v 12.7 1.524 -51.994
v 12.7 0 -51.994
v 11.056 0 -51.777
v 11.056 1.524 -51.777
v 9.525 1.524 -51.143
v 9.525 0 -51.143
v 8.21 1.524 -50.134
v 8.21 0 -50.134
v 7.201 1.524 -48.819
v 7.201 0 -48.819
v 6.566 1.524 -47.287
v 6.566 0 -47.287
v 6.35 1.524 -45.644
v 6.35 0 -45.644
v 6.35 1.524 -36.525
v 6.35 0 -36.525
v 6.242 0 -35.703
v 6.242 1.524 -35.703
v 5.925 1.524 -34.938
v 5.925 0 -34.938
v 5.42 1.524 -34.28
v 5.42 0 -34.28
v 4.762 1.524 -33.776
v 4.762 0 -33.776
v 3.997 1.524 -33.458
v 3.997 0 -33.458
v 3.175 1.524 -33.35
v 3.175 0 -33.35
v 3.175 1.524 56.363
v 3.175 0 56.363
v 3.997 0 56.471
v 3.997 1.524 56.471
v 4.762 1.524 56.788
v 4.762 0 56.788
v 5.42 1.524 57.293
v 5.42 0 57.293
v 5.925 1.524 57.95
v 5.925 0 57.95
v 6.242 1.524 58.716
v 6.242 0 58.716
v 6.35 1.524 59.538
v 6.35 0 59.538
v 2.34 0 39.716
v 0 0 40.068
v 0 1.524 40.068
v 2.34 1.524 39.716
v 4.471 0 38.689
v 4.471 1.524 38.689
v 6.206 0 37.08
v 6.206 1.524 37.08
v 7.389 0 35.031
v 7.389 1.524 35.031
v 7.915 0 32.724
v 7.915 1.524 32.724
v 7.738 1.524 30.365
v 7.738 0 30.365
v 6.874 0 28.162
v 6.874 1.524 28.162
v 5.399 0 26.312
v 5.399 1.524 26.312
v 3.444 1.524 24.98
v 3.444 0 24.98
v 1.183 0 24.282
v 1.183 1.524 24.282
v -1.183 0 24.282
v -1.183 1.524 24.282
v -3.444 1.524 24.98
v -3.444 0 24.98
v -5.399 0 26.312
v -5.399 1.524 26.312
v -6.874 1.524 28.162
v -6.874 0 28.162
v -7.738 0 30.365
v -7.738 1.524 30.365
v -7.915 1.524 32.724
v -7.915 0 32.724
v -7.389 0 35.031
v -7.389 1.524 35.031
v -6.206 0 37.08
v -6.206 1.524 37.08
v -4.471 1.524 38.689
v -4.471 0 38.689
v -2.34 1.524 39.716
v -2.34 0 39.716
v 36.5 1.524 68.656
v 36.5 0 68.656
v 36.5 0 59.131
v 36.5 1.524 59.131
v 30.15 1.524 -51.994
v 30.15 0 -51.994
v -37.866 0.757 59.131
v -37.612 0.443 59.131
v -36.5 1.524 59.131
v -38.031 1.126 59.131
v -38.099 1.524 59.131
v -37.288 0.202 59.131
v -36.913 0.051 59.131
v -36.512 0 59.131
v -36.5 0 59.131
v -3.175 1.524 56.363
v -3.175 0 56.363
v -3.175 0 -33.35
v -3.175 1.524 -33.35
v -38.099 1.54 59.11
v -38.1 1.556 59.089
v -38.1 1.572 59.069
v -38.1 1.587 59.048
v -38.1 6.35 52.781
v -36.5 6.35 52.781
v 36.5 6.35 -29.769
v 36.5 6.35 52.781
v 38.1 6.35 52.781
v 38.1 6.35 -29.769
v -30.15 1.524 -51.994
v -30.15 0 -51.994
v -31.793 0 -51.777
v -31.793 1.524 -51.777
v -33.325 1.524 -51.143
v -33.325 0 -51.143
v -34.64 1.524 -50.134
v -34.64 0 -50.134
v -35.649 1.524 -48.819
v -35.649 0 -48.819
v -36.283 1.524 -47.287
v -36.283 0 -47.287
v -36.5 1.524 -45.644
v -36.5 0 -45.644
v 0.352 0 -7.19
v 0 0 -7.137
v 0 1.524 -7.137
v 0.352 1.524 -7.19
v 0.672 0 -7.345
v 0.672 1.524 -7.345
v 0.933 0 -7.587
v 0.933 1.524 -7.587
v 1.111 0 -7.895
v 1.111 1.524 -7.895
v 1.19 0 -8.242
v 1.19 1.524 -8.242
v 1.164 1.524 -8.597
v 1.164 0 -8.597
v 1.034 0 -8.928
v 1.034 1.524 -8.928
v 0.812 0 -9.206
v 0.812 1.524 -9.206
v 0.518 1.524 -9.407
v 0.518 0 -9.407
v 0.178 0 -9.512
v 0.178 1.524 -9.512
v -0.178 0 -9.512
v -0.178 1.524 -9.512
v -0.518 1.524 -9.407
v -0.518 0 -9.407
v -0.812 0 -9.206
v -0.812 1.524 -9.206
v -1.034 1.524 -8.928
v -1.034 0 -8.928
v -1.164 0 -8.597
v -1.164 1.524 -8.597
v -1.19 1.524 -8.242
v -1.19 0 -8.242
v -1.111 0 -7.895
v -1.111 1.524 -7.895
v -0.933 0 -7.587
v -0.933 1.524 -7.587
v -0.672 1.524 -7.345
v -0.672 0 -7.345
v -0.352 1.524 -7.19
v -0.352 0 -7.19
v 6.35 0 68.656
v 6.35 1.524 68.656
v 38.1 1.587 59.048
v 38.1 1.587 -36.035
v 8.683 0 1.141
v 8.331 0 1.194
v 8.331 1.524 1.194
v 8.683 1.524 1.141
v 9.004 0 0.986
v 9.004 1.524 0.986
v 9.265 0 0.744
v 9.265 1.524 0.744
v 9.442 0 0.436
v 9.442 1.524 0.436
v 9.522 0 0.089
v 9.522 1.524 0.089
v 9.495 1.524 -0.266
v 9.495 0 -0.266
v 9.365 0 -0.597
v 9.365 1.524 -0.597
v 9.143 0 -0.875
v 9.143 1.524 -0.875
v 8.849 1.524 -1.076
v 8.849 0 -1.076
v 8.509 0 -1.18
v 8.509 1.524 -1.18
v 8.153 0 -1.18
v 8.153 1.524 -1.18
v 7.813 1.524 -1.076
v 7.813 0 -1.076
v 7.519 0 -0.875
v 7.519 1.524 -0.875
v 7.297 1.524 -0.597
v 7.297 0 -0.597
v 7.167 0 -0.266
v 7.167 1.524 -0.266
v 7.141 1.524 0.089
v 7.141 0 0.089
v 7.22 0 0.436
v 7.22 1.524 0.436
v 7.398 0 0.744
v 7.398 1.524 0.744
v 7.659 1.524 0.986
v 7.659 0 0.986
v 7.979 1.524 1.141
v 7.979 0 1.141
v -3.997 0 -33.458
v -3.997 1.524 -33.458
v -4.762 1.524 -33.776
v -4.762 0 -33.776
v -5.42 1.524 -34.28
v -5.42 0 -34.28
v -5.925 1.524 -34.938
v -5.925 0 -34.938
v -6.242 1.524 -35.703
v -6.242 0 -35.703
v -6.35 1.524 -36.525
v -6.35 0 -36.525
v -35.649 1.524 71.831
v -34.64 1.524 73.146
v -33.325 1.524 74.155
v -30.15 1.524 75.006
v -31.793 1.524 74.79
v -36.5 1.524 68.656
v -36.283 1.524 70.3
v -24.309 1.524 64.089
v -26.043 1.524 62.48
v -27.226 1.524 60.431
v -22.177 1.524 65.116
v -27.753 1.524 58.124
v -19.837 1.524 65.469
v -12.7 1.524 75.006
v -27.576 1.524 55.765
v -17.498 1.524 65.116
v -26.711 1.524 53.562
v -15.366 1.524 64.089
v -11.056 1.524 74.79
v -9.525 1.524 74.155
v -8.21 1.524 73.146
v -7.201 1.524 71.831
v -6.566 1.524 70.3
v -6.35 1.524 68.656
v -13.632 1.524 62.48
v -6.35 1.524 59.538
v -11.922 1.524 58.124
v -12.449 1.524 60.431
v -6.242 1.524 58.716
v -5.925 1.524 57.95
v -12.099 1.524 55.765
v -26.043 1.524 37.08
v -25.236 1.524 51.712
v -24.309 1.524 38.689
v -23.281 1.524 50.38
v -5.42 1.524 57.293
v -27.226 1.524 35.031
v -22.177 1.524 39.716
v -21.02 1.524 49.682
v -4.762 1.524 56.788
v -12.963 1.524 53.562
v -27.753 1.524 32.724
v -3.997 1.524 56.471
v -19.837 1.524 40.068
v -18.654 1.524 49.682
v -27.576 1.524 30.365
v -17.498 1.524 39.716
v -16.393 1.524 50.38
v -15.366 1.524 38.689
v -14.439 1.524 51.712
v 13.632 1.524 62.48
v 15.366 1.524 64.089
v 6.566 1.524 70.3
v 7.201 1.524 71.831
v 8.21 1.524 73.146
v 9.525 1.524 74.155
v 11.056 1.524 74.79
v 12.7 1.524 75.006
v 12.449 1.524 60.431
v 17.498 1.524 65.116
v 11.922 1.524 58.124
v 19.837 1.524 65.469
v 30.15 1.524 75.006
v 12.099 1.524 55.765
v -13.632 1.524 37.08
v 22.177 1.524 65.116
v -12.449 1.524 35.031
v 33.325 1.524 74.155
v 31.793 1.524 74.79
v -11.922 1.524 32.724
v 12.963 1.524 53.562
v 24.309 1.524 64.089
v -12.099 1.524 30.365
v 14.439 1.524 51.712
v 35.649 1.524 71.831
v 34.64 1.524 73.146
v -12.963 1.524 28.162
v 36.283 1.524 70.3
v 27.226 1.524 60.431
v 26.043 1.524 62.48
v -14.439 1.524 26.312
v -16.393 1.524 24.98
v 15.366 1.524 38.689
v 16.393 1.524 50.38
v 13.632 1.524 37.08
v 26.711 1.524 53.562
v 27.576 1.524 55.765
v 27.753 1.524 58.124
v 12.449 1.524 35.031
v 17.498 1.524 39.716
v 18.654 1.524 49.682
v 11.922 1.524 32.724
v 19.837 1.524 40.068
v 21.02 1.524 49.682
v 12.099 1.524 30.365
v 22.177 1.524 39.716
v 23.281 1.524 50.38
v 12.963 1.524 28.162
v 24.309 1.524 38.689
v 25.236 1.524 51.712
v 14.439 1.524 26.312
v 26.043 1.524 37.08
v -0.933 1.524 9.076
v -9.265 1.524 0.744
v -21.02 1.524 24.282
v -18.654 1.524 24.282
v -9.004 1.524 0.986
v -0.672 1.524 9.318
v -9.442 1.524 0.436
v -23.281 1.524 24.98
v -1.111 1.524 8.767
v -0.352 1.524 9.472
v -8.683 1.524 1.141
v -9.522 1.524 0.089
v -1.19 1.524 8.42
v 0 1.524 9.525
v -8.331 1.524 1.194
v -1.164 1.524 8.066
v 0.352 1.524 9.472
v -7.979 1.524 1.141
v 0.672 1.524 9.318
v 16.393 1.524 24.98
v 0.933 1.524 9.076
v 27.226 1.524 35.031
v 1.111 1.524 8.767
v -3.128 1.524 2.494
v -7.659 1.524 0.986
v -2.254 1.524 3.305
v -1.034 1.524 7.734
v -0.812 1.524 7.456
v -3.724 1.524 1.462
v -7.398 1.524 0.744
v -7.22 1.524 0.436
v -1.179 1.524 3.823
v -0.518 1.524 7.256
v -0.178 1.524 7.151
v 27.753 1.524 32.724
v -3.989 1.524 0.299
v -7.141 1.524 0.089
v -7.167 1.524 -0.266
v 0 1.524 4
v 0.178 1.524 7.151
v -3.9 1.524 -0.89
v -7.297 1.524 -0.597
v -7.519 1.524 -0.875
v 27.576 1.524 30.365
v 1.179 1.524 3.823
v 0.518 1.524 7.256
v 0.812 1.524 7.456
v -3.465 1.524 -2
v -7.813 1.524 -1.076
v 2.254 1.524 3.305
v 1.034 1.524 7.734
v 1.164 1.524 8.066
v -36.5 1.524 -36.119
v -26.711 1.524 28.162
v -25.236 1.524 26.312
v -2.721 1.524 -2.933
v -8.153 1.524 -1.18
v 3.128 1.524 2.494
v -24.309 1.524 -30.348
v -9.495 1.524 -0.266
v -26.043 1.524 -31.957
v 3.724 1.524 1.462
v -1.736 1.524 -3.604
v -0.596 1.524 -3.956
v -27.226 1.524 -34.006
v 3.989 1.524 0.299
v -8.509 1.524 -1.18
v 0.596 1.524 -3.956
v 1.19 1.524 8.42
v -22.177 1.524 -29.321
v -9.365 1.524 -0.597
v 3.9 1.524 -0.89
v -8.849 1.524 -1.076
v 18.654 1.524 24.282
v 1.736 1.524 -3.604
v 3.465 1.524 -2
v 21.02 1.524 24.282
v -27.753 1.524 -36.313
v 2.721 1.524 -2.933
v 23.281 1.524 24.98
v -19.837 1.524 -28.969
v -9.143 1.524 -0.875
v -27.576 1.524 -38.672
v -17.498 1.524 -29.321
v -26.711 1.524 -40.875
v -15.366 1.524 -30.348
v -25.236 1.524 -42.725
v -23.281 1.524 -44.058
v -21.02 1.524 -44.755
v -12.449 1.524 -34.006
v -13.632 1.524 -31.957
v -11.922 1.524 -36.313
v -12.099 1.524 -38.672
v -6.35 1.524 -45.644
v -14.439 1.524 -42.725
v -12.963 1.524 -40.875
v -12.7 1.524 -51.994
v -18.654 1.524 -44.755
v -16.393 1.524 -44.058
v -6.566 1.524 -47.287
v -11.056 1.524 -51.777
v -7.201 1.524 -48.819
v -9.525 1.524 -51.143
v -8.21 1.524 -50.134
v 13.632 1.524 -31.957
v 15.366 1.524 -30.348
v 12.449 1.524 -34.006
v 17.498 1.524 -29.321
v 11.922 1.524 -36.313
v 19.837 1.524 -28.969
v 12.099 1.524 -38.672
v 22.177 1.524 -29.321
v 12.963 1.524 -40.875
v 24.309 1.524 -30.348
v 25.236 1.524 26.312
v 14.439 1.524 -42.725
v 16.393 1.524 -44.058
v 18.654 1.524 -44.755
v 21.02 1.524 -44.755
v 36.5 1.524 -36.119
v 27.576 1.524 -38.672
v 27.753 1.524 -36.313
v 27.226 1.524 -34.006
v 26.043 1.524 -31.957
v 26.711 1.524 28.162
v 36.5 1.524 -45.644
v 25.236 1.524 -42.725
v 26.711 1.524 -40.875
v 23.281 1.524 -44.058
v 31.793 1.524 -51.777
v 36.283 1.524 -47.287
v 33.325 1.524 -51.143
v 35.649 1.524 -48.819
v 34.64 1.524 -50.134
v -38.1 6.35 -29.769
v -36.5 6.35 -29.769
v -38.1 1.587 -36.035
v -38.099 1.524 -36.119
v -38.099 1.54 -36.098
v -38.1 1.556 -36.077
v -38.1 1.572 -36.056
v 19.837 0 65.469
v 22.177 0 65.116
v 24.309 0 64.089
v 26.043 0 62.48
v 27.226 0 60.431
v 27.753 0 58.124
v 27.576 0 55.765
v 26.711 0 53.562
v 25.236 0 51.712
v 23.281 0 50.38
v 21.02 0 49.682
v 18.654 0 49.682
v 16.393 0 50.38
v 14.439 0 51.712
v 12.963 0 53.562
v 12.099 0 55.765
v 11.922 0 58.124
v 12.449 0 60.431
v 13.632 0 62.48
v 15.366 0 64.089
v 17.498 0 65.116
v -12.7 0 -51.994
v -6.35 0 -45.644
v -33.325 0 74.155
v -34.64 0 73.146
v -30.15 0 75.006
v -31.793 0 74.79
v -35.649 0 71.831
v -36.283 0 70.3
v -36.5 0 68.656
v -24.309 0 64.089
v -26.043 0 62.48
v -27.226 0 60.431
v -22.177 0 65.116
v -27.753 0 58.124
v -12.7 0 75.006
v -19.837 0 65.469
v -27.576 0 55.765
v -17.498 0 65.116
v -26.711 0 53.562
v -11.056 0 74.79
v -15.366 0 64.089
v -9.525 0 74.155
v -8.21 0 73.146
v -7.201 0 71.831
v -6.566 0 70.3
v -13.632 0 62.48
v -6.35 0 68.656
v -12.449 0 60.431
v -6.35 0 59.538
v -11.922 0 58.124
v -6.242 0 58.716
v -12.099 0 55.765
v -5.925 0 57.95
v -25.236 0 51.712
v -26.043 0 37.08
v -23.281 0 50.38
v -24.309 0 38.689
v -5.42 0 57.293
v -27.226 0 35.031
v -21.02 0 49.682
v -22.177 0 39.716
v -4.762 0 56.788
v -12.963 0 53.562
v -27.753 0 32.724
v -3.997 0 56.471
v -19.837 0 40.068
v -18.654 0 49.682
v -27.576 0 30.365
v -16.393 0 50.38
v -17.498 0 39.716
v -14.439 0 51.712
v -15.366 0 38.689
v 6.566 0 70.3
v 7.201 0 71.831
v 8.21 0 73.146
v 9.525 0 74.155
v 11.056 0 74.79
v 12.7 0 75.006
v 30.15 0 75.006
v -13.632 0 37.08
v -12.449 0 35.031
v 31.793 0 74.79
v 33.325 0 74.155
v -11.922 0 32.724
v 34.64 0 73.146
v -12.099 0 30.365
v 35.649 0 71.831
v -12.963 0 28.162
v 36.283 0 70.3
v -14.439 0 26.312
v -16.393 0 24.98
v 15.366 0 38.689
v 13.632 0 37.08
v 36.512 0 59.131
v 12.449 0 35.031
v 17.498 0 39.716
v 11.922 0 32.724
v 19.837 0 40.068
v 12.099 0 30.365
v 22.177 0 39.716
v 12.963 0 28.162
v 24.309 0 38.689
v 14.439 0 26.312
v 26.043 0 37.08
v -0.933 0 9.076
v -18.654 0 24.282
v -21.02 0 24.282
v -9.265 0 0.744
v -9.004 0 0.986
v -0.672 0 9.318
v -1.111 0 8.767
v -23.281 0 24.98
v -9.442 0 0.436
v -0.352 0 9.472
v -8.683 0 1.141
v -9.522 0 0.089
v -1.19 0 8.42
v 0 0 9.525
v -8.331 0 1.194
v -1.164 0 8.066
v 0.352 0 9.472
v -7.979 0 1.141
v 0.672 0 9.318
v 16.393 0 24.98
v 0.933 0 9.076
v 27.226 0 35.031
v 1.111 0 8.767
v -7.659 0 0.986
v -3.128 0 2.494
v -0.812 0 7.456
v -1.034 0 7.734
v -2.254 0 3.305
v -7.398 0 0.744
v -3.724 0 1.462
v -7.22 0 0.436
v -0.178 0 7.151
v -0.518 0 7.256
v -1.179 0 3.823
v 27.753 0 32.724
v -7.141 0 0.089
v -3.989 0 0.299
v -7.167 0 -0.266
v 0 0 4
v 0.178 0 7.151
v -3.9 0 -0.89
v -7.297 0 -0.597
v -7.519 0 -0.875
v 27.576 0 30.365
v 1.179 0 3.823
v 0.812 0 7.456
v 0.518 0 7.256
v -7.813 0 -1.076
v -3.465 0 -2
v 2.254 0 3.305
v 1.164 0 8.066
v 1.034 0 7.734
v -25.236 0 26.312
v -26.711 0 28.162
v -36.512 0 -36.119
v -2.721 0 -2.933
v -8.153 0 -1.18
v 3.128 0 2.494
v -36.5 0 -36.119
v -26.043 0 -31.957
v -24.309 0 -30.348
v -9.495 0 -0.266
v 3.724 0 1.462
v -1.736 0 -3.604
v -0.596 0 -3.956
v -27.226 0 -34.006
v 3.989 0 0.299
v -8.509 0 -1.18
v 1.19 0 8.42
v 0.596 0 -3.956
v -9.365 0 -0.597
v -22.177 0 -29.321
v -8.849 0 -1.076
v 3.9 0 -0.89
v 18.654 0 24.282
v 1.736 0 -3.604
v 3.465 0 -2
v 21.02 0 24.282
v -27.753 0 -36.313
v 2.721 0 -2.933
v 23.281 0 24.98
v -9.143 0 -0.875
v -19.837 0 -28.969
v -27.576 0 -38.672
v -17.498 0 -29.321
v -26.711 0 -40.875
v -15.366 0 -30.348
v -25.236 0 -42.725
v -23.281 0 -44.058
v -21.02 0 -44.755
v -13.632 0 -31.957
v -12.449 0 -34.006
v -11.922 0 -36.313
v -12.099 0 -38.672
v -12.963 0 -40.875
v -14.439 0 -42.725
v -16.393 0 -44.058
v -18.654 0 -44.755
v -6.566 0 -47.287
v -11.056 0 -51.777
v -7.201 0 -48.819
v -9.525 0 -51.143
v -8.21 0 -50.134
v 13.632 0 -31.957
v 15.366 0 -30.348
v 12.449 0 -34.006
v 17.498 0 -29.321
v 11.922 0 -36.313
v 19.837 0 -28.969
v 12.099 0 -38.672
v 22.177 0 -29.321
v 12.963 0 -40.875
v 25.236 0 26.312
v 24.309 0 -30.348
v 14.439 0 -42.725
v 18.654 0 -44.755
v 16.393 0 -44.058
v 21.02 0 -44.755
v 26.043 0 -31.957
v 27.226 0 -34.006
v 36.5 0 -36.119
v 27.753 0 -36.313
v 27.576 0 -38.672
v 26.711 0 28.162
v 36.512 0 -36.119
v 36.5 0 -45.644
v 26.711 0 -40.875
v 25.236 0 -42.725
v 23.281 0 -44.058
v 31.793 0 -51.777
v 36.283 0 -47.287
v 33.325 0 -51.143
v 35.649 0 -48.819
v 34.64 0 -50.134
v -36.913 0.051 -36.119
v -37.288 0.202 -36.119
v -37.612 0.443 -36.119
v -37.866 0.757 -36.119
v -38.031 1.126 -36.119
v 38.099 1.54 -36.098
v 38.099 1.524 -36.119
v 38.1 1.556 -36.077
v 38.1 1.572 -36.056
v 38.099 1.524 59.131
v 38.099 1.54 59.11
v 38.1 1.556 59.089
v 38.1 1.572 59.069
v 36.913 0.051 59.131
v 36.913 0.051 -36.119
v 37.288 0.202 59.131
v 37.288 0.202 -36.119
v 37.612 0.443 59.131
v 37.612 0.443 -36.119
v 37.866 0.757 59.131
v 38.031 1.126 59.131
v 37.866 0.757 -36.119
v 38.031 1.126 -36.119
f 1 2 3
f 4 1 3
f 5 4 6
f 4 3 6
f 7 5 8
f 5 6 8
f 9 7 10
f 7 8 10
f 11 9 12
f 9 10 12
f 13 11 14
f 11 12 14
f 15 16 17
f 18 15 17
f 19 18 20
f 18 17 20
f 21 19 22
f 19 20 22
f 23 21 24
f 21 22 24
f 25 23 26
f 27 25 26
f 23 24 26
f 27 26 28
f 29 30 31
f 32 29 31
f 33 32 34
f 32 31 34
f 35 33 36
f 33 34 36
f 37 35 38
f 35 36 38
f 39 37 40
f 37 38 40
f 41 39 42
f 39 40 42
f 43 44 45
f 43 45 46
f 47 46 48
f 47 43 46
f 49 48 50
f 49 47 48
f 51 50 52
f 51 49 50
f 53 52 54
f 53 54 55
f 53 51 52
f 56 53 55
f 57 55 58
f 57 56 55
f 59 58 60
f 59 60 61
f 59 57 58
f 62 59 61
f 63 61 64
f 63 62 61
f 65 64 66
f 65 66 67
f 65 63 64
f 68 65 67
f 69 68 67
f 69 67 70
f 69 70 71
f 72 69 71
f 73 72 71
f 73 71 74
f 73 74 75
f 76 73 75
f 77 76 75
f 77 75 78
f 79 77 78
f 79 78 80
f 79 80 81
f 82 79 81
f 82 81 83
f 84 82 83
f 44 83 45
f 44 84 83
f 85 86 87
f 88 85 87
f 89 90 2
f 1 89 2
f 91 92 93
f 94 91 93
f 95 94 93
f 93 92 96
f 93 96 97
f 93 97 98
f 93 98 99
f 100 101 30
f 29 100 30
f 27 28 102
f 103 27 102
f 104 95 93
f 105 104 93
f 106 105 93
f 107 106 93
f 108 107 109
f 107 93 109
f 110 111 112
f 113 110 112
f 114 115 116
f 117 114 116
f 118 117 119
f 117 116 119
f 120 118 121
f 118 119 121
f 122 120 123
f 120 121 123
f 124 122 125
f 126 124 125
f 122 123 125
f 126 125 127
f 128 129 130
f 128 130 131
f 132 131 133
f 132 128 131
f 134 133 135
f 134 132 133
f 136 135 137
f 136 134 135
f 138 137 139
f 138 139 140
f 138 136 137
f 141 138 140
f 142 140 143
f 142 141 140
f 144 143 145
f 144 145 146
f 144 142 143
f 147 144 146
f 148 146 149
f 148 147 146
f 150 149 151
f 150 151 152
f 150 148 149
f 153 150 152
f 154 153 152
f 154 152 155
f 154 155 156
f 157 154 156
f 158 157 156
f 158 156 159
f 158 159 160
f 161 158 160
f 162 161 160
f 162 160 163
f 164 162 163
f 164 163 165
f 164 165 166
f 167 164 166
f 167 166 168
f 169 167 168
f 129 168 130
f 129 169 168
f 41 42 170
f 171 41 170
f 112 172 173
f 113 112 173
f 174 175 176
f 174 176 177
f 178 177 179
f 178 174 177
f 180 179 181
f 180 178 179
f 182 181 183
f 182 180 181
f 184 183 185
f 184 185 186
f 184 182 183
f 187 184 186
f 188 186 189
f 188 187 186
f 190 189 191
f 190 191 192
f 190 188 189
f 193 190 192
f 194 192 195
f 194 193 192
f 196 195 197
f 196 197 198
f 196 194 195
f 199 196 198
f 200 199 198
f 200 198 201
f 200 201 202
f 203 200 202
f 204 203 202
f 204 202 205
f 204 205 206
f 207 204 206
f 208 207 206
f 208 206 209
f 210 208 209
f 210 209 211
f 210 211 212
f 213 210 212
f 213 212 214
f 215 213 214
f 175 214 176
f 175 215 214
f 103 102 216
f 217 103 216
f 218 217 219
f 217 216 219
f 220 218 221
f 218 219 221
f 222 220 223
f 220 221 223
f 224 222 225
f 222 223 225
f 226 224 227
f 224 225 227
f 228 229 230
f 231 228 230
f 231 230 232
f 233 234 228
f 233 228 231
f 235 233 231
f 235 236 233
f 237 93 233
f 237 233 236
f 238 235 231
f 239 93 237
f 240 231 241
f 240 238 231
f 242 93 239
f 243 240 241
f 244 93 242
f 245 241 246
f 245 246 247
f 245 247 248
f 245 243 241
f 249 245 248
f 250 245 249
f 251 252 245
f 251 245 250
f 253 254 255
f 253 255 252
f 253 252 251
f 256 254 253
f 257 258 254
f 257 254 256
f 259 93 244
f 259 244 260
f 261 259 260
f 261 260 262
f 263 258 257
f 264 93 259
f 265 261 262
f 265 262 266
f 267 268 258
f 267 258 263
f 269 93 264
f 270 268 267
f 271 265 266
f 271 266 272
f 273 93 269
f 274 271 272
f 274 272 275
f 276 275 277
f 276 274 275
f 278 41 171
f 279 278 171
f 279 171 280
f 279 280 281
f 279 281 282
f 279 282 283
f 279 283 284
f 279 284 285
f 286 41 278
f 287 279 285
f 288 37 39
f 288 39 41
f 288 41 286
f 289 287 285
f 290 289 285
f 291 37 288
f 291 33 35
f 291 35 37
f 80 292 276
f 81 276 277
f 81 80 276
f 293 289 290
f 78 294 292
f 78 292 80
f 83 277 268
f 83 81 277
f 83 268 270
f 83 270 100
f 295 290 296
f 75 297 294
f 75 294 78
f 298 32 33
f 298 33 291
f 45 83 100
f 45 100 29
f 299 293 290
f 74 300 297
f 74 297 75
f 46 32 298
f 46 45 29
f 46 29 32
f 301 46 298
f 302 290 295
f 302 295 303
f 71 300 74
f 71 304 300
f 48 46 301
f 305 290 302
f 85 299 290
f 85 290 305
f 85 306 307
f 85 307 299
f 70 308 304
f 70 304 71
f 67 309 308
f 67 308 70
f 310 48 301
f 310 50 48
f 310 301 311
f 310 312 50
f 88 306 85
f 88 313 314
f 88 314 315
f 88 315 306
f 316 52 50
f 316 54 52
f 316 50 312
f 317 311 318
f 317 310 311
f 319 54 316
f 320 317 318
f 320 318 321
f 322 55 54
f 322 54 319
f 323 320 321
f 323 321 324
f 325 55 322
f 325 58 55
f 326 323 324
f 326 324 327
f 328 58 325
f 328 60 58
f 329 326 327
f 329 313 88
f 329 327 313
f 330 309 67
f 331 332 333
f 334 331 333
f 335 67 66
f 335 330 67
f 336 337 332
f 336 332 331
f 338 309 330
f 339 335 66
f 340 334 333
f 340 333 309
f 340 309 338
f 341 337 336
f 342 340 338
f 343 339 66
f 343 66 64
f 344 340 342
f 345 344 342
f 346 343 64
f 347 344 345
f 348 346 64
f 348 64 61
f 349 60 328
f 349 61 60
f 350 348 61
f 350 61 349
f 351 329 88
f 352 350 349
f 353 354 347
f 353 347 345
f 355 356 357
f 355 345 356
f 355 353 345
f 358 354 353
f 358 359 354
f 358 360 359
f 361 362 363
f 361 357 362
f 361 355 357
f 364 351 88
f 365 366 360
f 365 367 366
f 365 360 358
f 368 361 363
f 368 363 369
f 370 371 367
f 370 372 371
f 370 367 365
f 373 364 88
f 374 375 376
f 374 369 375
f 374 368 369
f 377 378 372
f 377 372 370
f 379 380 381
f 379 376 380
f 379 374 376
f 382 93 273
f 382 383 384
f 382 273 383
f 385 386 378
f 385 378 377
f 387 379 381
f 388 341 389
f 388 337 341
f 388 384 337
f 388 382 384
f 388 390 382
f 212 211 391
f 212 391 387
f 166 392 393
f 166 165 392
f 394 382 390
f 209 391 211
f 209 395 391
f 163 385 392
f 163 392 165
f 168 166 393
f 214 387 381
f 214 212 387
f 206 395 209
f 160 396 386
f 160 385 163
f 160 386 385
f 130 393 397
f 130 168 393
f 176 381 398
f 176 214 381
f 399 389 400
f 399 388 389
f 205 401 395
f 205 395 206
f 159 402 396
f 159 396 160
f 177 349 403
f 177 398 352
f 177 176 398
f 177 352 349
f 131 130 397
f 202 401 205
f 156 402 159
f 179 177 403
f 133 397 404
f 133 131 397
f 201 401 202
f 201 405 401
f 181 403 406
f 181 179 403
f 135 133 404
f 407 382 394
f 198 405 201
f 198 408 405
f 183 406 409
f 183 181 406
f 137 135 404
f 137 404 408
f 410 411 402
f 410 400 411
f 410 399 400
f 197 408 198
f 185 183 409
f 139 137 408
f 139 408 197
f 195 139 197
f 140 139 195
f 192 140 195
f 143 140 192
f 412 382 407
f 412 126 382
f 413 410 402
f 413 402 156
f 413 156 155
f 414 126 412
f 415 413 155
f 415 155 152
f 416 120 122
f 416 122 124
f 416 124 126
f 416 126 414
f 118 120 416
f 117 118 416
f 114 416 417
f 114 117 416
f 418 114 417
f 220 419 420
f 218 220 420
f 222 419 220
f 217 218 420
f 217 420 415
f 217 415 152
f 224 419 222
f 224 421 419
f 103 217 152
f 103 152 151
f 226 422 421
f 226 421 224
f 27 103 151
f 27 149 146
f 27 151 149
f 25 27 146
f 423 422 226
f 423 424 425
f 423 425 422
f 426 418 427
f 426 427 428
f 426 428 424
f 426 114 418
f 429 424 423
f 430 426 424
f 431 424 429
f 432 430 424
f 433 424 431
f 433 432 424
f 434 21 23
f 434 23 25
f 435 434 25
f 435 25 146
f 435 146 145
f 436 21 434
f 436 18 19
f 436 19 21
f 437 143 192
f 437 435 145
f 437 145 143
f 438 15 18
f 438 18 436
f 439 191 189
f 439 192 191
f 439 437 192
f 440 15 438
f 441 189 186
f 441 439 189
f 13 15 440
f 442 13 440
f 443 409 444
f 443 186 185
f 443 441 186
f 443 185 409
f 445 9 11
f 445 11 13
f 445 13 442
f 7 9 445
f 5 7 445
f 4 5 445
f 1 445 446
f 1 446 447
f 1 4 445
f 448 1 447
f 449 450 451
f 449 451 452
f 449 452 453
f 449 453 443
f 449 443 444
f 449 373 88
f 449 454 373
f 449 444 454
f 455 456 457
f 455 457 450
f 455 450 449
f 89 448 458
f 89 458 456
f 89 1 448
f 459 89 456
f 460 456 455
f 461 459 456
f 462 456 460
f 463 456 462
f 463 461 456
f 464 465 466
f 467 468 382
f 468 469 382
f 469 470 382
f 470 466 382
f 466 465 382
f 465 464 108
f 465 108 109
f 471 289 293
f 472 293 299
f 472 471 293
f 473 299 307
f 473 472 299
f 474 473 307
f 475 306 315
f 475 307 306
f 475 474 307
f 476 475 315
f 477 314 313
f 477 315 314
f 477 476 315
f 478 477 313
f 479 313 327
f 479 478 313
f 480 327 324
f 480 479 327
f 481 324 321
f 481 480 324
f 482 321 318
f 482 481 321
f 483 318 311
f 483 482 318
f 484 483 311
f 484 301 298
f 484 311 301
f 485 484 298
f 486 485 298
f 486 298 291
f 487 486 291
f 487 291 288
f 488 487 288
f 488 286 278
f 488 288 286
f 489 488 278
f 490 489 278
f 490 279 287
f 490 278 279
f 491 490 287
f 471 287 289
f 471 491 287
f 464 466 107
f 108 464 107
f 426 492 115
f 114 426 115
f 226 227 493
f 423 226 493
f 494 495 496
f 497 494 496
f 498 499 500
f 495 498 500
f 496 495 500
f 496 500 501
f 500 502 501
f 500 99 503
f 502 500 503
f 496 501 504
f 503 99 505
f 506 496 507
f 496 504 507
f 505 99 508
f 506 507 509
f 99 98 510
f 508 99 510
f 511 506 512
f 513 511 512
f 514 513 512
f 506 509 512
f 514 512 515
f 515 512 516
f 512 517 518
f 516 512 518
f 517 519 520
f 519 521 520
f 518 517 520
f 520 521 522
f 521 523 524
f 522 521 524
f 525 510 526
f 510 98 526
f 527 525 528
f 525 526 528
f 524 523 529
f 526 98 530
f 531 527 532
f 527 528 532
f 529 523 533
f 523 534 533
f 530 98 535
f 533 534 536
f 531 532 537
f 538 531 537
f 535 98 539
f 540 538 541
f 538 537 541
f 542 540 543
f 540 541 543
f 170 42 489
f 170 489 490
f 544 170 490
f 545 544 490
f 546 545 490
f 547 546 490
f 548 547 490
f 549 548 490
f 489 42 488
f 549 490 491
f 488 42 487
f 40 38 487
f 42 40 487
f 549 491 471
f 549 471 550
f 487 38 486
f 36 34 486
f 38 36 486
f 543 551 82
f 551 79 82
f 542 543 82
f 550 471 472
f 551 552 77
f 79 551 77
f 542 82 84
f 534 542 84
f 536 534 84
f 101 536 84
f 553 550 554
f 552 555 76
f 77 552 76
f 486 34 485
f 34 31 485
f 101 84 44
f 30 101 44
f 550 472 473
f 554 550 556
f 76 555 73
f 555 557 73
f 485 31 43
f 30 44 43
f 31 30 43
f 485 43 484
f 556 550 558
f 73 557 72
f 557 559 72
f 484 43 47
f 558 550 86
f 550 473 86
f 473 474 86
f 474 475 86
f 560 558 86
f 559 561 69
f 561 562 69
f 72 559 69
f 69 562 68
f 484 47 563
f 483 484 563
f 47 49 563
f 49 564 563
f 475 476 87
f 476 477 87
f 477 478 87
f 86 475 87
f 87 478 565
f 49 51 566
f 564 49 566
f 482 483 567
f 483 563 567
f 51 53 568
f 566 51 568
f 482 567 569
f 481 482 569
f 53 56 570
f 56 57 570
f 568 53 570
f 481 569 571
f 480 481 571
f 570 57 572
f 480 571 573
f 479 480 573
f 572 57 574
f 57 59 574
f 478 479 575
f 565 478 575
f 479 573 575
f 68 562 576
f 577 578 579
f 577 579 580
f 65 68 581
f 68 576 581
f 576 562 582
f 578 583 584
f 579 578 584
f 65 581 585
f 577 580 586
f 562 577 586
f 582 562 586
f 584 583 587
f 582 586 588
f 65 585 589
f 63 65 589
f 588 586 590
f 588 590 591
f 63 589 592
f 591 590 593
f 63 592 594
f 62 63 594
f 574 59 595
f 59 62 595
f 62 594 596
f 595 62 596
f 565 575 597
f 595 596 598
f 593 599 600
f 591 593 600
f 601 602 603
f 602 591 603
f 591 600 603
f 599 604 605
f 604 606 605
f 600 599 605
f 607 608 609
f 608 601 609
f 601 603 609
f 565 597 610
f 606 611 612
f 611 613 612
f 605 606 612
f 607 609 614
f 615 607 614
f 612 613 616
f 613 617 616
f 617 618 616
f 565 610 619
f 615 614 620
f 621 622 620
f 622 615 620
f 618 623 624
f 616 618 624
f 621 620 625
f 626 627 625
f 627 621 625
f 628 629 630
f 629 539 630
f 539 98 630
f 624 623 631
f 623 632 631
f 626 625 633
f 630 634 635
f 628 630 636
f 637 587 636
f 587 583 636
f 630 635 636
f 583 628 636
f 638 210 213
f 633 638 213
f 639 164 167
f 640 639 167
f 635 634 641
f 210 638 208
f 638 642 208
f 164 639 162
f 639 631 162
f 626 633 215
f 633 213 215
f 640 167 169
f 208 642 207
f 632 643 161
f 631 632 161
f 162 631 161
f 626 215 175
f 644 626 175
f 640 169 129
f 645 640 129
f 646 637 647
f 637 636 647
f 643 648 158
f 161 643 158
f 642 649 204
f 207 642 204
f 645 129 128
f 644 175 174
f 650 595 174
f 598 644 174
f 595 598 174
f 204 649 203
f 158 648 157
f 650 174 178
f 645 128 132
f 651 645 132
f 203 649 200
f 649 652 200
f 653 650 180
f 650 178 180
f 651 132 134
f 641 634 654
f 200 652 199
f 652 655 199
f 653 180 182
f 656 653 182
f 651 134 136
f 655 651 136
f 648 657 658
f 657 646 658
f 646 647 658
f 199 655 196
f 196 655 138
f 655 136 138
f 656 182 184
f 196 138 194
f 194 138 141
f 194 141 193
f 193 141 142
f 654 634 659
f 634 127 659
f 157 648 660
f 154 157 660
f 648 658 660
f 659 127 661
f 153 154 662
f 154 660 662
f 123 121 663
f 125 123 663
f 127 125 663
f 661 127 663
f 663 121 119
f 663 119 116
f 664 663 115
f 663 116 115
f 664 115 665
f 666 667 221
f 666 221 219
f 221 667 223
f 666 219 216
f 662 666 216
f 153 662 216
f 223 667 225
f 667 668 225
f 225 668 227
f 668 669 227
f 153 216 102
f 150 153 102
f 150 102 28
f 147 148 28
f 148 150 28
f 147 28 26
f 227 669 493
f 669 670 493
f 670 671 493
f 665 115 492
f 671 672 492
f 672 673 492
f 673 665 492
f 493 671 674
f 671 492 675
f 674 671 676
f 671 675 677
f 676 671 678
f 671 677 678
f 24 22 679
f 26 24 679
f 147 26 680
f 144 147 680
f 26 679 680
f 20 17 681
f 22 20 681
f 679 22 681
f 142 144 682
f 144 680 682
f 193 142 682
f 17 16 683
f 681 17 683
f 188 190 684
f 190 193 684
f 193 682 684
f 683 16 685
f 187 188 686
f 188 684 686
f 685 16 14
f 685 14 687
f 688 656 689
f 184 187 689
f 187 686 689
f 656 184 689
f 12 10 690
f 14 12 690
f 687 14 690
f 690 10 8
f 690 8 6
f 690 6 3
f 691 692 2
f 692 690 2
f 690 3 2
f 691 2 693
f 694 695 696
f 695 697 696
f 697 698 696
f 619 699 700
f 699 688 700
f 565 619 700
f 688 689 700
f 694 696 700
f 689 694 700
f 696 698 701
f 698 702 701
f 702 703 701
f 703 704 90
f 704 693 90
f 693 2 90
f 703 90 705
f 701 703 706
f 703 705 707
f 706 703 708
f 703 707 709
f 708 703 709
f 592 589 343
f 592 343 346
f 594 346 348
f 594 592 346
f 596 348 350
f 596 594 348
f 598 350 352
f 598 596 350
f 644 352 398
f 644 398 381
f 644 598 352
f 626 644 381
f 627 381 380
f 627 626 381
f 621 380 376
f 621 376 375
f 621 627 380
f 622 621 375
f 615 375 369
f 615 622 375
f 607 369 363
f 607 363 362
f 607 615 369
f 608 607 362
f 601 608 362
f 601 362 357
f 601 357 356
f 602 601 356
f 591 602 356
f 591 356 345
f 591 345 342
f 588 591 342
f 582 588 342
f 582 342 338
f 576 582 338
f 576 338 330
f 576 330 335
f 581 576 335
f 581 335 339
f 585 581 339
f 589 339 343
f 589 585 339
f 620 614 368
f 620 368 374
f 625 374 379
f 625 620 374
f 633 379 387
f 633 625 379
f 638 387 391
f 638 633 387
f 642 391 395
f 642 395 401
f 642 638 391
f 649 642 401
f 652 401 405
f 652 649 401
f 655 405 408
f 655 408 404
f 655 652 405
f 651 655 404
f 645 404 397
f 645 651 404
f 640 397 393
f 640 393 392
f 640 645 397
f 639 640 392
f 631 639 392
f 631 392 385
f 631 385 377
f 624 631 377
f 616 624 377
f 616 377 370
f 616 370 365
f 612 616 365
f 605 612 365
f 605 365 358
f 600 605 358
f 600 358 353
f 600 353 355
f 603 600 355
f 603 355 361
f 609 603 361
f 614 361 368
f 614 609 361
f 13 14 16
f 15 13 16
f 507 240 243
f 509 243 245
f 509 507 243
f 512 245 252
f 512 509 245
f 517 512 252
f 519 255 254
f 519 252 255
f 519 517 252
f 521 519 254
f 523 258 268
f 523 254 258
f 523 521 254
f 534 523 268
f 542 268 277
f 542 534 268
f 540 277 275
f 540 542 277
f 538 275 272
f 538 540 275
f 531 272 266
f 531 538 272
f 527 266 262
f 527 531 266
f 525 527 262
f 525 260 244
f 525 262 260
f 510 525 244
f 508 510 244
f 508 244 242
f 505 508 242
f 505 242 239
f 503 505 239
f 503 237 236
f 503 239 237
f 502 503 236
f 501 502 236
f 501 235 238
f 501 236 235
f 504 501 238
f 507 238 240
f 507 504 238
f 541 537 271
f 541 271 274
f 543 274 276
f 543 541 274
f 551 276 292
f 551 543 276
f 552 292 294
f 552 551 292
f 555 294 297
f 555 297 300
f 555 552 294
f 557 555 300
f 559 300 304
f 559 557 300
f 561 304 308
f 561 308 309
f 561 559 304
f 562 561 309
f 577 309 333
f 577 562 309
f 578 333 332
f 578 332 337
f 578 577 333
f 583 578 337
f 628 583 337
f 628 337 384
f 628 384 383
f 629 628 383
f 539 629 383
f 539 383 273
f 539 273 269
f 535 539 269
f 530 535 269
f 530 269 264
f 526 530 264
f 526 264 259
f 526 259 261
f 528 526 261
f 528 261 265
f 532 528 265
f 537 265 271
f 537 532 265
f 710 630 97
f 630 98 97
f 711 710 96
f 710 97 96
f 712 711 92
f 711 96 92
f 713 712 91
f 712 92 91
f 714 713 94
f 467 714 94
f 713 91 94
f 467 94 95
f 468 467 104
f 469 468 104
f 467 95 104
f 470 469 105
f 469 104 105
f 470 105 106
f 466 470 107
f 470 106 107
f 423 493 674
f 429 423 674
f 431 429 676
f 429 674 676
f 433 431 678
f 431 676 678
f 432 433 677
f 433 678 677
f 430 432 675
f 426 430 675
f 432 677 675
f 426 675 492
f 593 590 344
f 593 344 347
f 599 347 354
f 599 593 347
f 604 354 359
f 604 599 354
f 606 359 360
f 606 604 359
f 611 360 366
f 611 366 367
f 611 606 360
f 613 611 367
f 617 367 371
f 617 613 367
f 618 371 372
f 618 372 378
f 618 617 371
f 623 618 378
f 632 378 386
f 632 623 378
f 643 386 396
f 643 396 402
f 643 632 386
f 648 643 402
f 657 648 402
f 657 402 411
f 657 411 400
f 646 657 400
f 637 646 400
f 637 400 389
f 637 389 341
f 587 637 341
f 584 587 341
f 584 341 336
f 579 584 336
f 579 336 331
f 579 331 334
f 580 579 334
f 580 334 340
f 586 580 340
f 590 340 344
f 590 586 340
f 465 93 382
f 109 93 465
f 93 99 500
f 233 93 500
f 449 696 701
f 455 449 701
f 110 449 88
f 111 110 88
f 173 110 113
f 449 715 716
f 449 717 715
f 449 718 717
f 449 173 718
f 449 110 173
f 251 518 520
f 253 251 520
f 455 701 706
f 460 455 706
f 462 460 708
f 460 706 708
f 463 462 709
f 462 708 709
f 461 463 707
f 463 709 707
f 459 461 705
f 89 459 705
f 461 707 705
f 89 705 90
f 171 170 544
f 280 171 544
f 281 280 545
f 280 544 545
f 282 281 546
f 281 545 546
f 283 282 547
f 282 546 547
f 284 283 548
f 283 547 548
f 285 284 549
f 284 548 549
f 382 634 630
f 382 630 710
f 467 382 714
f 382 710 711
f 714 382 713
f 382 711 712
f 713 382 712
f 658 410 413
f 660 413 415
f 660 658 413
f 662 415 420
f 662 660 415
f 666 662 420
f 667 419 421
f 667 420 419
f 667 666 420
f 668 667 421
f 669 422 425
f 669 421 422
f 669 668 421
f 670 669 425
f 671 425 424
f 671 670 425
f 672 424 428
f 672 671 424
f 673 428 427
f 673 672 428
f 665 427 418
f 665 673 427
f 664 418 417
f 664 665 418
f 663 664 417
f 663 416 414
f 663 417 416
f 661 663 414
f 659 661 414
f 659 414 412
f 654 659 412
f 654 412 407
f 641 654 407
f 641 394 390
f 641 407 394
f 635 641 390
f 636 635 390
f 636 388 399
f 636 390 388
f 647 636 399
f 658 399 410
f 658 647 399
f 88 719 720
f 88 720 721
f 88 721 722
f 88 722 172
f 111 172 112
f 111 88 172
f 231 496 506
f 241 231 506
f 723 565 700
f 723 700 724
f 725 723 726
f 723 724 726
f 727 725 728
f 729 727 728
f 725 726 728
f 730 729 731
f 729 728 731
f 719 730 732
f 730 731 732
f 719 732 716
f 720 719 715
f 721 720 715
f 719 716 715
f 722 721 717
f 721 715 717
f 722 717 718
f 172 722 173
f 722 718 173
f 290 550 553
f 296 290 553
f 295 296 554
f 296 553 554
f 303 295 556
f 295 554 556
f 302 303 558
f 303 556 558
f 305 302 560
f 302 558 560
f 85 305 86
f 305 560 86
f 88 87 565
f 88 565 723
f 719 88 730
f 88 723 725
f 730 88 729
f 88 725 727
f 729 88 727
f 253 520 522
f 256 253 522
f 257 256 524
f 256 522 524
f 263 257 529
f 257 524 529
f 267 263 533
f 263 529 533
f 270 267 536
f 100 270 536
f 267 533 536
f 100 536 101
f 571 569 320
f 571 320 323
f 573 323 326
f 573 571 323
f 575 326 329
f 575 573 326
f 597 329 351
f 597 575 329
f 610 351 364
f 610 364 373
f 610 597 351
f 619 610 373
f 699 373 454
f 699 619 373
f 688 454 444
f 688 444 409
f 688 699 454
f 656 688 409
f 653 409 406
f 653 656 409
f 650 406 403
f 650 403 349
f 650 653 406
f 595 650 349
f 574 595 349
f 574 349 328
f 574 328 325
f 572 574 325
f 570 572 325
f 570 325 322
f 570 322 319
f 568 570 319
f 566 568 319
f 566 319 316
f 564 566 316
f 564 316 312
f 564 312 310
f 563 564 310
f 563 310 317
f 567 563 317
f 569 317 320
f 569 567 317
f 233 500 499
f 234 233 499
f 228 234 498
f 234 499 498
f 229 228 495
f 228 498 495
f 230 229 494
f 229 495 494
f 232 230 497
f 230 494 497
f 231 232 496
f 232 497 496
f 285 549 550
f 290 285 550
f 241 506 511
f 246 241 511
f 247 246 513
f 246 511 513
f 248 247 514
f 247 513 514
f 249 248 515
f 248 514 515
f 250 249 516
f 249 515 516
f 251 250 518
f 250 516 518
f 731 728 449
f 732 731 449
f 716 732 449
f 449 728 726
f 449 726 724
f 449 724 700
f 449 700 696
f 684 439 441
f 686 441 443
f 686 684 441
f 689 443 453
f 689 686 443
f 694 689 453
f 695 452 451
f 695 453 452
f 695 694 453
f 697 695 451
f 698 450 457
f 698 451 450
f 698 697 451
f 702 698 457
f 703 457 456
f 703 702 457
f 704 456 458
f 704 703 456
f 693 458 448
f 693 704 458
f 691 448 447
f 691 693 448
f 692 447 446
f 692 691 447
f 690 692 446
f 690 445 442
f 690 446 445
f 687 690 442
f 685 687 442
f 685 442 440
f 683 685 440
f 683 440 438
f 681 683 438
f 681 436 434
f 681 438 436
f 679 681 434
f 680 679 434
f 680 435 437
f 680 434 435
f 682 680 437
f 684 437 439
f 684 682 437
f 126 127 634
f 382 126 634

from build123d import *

# Parameters (mm, degrees)
SKETCH1_R               = 7.9375
SKETCH1_R_2             = 4.0005
SKETCH1_R_3             = 1.1938
EXTRUDE1_DEPTH          = 1.524
EXTRUDE2_DEPTH          = 6.35
CUT_EXTRUDE1_DEPTH      = 39.1
CUT_EXTRUDE1_DEPTH_BACK = 39.1
FILLET1_R               = 1.5875


with BuildPart() as part:
    # Sketch1 → Extrude1 (new body)
    with BuildSketch(Plane(origin=(0, 0, 0), x_dir=(1, 0, 0), z_dir=(0, 1, 0))):
        with BuildLine():
            Line((36.4998, -62.3062), (36.4998, 36.1188))
            Line((36.4998, 36.1188), (36.4998, 39.2938))
            Line((36.4998, 39.2938), (36.4998, 45.6438))
            ThreePointArc((36.4998, 45.6438), (34.639928061, 50.133928061), (30.1498, 51.9938))
            Line((30.1498, 51.9938), (23.7998, 51.9938))
            Line((23.7998, 51.9938), (12.7, 51.9938))
            ThreePointArc((12.7, 51.9938), (8.209871939, 50.133928061), (6.35, 45.6438))
            Line((6.35, 45.6438), (6.35, 36.5252))
            ThreePointArc((6.35, 36.5252), (5.42006403, 34.28013597), (3.175, 33.3502))
            Line((3.175, 33.3502), (-3.175, 33.3502))
            ThreePointArc((-3.175, 33.3502), (-5.42006403, 34.28013597), (-6.35, 36.5252))
            Line((-6.35, 36.5252), (-6.35, 45.6438))
            ThreePointArc((-6.35, 45.6438), (-8.209871939, 50.133928061), (-12.7, 51.9938))
            Line((-12.7, 51.9938), (-23.7998, 51.9938))
            Line((-23.7998, 51.9938), (-30.1498, 51.9938))
            ThreePointArc((-30.1498, 51.9938), (-34.639928061, 50.133928061), (-36.4998, 45.6438))
            Line((-36.4998, 45.6438), (-36.4998, 39.2938))
            Line((-36.4998, 39.2938), (-36.4998, 36.1188))
            Line((-36.4998, 36.1188), (-36.4998, -62.3062))
            Line((-36.4998, -62.3062), (-36.4998, -68.6562))
            ThreePointArc((-36.4998, -68.6562), (-34.639928061, -73.146328061), (-30.1498, -75.0062))
            Line((-30.1498, -75.0062), (-23.7998, -75.0062))
            Line((-23.7998, -75.0062), (-12.7, -75.0062))
            ThreePointArc((-12.7, -75.0062), (-8.209871939, -73.146328061), (-6.35, -68.6562))
            Line((-6.35, -68.6562), (-6.35, -59.5376))
            ThreePointArc((-6.35, -59.5376), (-5.42006403, -57.29253597), (-3.175, -56.3626))
            Line((-3.175, -56.3626), (3.175, -56.3626))
            ThreePointArc((3.175, -56.3626), (5.42006403, -57.29253597), (6.35, -59.5376))
            Line((6.35, -59.5376), (6.35, -68.6562))
            ThreePointArc((6.35, -68.6562), (8.209871939, -73.146328061), (12.7, -75.0062))
            Line((12.7, -75.0062), (23.7998, -75.0062))
            Line((23.7998, -75.0062), (30.1498, -75.0062))
            ThreePointArc((30.1498, -75.0062), (34.639928061, -73.146328061), (36.4998, -68.6562))
            Line((36.4998, -68.6562), (36.4998, -62.3062))
        make_face()
        with Locations(Location((19.8374, -57.531, 0), (0, 0, 270))):  # turned: the seam where the file's is
            Circle(SKETCH1_R, mode=Mode.SUBTRACT)
        with Locations(Location((19.8374, -32.131, 0), (0, 0, 270))):  # turned: the seam where the file's is
            Circle(SKETCH1_R, mode=Mode.SUBTRACT)
        with Locations(Location((0, 0, 0), (0, 0, 270))):  # turned: the seam where the file's is
            Circle(SKETCH1_R_2, mode=Mode.SUBTRACT)
        with Locations(Location((8.3312, 0, 0), (0, 0, 270))):  # turned: the seam where the file's is
            Circle(SKETCH1_R_3, mode=Mode.SUBTRACT)
        with Locations(Location((0, -8.3312, 0), (0, 0, 270))):  # turned: the seam where the file's is
            Circle(SKETCH1_R_3, mode=Mode.SUBTRACT)
        with Locations(Location((0, 8.3312, 0), (0, 0, 270))):  # turned: the seam where the file's is
            Circle(SKETCH1_R_3, mode=Mode.SUBTRACT)
        with Locations(Location((-8.3312, 0, 0), (0, 0, 270))):  # turned: the seam where the file's is
            Circle(SKETCH1_R_3, mode=Mode.SUBTRACT)
        with Locations(Location((19.8374, 36.9062, 0), (0, 0, 270))):  # turned: the seam where the file's is
            Circle(SKETCH1_R, mode=Mode.SUBTRACT)
        with Locations(Location((0, -32.131, 0), (0, 0, 270))):  # turned: the seam where the file's is
            Circle(SKETCH1_R, mode=Mode.SUBTRACT)
        with Locations(Location((-19.8374, 36.9062, 0), (0, 0, 270))):  # turned: the seam where the file's is
            Circle(SKETCH1_R, mode=Mode.SUBTRACT)
        with Locations(Location((-19.8374, -32.131, 0), (0, 0, 270))):  # turned: the seam where the file's is
            Circle(SKETCH1_R, mode=Mode.SUBTRACT)
        with Locations(Location((-19.8374, -57.531, 0), (0, 0, 270))):  # turned: the seam where the file's is
            Circle(SKETCH1_R, mode=Mode.SUBTRACT)
    extrude(amount=EXTRUDE1_DEPTH)

    # Sketch1_3 → Extrude2 (add)
    with BuildSketch(Plane(origin=(0, 0, 0), x_dir=(1, 0, 0), z_dir=(0, 1, 0))):
        Polygon((36.4998, 36.1188), (36.4998, -59.1312), (38.1, -59.1312), (38.1, 29.7688), (38.1, 36.1188), align=None)
        Polygon((-38.1, -59.1312), (-36.4998, -59.1312), (-36.4998, 36.1188), (-38.1, 36.1188), (-38.1, 29.7688), align=None)
    extrude(amount=EXTRUDE2_DEPTH)

    # Sketch2 → Cut-Extrude1 (cut, two sides)
    with BuildSketch(Plane(origin=(0, 0, 0), x_dir=(0, 0, -1), z_dir=(1, 0, 0))) as cut_extrude1_sk:
        Polygon((-59.1312, 6.35), (-59.1312, 1.524), (-52.7812, 6.35), align=None)
        Polygon((36.1188, 6.35), (29.7688, 6.35), (36.1188, 1.524), align=None)
    extrude(amount=CUT_EXTRUDE1_DEPTH, mode=Mode.SUBTRACT)
    extrude(cut_extrude1_sk.sketch, amount=-CUT_EXTRUDE1_DEPTH_BACK, mode=Mode.SUBTRACT)

    # Fillet1
    fillet1_edges = [part.edges().sort_by_distance(p)[0] for p in [
        (38.1, 0, 11.5062),
        (-38.1, 0, 11.5062),
    ]]
    fillet(fillet1_edges, radius=FILLET1_R)


solid = part.part
